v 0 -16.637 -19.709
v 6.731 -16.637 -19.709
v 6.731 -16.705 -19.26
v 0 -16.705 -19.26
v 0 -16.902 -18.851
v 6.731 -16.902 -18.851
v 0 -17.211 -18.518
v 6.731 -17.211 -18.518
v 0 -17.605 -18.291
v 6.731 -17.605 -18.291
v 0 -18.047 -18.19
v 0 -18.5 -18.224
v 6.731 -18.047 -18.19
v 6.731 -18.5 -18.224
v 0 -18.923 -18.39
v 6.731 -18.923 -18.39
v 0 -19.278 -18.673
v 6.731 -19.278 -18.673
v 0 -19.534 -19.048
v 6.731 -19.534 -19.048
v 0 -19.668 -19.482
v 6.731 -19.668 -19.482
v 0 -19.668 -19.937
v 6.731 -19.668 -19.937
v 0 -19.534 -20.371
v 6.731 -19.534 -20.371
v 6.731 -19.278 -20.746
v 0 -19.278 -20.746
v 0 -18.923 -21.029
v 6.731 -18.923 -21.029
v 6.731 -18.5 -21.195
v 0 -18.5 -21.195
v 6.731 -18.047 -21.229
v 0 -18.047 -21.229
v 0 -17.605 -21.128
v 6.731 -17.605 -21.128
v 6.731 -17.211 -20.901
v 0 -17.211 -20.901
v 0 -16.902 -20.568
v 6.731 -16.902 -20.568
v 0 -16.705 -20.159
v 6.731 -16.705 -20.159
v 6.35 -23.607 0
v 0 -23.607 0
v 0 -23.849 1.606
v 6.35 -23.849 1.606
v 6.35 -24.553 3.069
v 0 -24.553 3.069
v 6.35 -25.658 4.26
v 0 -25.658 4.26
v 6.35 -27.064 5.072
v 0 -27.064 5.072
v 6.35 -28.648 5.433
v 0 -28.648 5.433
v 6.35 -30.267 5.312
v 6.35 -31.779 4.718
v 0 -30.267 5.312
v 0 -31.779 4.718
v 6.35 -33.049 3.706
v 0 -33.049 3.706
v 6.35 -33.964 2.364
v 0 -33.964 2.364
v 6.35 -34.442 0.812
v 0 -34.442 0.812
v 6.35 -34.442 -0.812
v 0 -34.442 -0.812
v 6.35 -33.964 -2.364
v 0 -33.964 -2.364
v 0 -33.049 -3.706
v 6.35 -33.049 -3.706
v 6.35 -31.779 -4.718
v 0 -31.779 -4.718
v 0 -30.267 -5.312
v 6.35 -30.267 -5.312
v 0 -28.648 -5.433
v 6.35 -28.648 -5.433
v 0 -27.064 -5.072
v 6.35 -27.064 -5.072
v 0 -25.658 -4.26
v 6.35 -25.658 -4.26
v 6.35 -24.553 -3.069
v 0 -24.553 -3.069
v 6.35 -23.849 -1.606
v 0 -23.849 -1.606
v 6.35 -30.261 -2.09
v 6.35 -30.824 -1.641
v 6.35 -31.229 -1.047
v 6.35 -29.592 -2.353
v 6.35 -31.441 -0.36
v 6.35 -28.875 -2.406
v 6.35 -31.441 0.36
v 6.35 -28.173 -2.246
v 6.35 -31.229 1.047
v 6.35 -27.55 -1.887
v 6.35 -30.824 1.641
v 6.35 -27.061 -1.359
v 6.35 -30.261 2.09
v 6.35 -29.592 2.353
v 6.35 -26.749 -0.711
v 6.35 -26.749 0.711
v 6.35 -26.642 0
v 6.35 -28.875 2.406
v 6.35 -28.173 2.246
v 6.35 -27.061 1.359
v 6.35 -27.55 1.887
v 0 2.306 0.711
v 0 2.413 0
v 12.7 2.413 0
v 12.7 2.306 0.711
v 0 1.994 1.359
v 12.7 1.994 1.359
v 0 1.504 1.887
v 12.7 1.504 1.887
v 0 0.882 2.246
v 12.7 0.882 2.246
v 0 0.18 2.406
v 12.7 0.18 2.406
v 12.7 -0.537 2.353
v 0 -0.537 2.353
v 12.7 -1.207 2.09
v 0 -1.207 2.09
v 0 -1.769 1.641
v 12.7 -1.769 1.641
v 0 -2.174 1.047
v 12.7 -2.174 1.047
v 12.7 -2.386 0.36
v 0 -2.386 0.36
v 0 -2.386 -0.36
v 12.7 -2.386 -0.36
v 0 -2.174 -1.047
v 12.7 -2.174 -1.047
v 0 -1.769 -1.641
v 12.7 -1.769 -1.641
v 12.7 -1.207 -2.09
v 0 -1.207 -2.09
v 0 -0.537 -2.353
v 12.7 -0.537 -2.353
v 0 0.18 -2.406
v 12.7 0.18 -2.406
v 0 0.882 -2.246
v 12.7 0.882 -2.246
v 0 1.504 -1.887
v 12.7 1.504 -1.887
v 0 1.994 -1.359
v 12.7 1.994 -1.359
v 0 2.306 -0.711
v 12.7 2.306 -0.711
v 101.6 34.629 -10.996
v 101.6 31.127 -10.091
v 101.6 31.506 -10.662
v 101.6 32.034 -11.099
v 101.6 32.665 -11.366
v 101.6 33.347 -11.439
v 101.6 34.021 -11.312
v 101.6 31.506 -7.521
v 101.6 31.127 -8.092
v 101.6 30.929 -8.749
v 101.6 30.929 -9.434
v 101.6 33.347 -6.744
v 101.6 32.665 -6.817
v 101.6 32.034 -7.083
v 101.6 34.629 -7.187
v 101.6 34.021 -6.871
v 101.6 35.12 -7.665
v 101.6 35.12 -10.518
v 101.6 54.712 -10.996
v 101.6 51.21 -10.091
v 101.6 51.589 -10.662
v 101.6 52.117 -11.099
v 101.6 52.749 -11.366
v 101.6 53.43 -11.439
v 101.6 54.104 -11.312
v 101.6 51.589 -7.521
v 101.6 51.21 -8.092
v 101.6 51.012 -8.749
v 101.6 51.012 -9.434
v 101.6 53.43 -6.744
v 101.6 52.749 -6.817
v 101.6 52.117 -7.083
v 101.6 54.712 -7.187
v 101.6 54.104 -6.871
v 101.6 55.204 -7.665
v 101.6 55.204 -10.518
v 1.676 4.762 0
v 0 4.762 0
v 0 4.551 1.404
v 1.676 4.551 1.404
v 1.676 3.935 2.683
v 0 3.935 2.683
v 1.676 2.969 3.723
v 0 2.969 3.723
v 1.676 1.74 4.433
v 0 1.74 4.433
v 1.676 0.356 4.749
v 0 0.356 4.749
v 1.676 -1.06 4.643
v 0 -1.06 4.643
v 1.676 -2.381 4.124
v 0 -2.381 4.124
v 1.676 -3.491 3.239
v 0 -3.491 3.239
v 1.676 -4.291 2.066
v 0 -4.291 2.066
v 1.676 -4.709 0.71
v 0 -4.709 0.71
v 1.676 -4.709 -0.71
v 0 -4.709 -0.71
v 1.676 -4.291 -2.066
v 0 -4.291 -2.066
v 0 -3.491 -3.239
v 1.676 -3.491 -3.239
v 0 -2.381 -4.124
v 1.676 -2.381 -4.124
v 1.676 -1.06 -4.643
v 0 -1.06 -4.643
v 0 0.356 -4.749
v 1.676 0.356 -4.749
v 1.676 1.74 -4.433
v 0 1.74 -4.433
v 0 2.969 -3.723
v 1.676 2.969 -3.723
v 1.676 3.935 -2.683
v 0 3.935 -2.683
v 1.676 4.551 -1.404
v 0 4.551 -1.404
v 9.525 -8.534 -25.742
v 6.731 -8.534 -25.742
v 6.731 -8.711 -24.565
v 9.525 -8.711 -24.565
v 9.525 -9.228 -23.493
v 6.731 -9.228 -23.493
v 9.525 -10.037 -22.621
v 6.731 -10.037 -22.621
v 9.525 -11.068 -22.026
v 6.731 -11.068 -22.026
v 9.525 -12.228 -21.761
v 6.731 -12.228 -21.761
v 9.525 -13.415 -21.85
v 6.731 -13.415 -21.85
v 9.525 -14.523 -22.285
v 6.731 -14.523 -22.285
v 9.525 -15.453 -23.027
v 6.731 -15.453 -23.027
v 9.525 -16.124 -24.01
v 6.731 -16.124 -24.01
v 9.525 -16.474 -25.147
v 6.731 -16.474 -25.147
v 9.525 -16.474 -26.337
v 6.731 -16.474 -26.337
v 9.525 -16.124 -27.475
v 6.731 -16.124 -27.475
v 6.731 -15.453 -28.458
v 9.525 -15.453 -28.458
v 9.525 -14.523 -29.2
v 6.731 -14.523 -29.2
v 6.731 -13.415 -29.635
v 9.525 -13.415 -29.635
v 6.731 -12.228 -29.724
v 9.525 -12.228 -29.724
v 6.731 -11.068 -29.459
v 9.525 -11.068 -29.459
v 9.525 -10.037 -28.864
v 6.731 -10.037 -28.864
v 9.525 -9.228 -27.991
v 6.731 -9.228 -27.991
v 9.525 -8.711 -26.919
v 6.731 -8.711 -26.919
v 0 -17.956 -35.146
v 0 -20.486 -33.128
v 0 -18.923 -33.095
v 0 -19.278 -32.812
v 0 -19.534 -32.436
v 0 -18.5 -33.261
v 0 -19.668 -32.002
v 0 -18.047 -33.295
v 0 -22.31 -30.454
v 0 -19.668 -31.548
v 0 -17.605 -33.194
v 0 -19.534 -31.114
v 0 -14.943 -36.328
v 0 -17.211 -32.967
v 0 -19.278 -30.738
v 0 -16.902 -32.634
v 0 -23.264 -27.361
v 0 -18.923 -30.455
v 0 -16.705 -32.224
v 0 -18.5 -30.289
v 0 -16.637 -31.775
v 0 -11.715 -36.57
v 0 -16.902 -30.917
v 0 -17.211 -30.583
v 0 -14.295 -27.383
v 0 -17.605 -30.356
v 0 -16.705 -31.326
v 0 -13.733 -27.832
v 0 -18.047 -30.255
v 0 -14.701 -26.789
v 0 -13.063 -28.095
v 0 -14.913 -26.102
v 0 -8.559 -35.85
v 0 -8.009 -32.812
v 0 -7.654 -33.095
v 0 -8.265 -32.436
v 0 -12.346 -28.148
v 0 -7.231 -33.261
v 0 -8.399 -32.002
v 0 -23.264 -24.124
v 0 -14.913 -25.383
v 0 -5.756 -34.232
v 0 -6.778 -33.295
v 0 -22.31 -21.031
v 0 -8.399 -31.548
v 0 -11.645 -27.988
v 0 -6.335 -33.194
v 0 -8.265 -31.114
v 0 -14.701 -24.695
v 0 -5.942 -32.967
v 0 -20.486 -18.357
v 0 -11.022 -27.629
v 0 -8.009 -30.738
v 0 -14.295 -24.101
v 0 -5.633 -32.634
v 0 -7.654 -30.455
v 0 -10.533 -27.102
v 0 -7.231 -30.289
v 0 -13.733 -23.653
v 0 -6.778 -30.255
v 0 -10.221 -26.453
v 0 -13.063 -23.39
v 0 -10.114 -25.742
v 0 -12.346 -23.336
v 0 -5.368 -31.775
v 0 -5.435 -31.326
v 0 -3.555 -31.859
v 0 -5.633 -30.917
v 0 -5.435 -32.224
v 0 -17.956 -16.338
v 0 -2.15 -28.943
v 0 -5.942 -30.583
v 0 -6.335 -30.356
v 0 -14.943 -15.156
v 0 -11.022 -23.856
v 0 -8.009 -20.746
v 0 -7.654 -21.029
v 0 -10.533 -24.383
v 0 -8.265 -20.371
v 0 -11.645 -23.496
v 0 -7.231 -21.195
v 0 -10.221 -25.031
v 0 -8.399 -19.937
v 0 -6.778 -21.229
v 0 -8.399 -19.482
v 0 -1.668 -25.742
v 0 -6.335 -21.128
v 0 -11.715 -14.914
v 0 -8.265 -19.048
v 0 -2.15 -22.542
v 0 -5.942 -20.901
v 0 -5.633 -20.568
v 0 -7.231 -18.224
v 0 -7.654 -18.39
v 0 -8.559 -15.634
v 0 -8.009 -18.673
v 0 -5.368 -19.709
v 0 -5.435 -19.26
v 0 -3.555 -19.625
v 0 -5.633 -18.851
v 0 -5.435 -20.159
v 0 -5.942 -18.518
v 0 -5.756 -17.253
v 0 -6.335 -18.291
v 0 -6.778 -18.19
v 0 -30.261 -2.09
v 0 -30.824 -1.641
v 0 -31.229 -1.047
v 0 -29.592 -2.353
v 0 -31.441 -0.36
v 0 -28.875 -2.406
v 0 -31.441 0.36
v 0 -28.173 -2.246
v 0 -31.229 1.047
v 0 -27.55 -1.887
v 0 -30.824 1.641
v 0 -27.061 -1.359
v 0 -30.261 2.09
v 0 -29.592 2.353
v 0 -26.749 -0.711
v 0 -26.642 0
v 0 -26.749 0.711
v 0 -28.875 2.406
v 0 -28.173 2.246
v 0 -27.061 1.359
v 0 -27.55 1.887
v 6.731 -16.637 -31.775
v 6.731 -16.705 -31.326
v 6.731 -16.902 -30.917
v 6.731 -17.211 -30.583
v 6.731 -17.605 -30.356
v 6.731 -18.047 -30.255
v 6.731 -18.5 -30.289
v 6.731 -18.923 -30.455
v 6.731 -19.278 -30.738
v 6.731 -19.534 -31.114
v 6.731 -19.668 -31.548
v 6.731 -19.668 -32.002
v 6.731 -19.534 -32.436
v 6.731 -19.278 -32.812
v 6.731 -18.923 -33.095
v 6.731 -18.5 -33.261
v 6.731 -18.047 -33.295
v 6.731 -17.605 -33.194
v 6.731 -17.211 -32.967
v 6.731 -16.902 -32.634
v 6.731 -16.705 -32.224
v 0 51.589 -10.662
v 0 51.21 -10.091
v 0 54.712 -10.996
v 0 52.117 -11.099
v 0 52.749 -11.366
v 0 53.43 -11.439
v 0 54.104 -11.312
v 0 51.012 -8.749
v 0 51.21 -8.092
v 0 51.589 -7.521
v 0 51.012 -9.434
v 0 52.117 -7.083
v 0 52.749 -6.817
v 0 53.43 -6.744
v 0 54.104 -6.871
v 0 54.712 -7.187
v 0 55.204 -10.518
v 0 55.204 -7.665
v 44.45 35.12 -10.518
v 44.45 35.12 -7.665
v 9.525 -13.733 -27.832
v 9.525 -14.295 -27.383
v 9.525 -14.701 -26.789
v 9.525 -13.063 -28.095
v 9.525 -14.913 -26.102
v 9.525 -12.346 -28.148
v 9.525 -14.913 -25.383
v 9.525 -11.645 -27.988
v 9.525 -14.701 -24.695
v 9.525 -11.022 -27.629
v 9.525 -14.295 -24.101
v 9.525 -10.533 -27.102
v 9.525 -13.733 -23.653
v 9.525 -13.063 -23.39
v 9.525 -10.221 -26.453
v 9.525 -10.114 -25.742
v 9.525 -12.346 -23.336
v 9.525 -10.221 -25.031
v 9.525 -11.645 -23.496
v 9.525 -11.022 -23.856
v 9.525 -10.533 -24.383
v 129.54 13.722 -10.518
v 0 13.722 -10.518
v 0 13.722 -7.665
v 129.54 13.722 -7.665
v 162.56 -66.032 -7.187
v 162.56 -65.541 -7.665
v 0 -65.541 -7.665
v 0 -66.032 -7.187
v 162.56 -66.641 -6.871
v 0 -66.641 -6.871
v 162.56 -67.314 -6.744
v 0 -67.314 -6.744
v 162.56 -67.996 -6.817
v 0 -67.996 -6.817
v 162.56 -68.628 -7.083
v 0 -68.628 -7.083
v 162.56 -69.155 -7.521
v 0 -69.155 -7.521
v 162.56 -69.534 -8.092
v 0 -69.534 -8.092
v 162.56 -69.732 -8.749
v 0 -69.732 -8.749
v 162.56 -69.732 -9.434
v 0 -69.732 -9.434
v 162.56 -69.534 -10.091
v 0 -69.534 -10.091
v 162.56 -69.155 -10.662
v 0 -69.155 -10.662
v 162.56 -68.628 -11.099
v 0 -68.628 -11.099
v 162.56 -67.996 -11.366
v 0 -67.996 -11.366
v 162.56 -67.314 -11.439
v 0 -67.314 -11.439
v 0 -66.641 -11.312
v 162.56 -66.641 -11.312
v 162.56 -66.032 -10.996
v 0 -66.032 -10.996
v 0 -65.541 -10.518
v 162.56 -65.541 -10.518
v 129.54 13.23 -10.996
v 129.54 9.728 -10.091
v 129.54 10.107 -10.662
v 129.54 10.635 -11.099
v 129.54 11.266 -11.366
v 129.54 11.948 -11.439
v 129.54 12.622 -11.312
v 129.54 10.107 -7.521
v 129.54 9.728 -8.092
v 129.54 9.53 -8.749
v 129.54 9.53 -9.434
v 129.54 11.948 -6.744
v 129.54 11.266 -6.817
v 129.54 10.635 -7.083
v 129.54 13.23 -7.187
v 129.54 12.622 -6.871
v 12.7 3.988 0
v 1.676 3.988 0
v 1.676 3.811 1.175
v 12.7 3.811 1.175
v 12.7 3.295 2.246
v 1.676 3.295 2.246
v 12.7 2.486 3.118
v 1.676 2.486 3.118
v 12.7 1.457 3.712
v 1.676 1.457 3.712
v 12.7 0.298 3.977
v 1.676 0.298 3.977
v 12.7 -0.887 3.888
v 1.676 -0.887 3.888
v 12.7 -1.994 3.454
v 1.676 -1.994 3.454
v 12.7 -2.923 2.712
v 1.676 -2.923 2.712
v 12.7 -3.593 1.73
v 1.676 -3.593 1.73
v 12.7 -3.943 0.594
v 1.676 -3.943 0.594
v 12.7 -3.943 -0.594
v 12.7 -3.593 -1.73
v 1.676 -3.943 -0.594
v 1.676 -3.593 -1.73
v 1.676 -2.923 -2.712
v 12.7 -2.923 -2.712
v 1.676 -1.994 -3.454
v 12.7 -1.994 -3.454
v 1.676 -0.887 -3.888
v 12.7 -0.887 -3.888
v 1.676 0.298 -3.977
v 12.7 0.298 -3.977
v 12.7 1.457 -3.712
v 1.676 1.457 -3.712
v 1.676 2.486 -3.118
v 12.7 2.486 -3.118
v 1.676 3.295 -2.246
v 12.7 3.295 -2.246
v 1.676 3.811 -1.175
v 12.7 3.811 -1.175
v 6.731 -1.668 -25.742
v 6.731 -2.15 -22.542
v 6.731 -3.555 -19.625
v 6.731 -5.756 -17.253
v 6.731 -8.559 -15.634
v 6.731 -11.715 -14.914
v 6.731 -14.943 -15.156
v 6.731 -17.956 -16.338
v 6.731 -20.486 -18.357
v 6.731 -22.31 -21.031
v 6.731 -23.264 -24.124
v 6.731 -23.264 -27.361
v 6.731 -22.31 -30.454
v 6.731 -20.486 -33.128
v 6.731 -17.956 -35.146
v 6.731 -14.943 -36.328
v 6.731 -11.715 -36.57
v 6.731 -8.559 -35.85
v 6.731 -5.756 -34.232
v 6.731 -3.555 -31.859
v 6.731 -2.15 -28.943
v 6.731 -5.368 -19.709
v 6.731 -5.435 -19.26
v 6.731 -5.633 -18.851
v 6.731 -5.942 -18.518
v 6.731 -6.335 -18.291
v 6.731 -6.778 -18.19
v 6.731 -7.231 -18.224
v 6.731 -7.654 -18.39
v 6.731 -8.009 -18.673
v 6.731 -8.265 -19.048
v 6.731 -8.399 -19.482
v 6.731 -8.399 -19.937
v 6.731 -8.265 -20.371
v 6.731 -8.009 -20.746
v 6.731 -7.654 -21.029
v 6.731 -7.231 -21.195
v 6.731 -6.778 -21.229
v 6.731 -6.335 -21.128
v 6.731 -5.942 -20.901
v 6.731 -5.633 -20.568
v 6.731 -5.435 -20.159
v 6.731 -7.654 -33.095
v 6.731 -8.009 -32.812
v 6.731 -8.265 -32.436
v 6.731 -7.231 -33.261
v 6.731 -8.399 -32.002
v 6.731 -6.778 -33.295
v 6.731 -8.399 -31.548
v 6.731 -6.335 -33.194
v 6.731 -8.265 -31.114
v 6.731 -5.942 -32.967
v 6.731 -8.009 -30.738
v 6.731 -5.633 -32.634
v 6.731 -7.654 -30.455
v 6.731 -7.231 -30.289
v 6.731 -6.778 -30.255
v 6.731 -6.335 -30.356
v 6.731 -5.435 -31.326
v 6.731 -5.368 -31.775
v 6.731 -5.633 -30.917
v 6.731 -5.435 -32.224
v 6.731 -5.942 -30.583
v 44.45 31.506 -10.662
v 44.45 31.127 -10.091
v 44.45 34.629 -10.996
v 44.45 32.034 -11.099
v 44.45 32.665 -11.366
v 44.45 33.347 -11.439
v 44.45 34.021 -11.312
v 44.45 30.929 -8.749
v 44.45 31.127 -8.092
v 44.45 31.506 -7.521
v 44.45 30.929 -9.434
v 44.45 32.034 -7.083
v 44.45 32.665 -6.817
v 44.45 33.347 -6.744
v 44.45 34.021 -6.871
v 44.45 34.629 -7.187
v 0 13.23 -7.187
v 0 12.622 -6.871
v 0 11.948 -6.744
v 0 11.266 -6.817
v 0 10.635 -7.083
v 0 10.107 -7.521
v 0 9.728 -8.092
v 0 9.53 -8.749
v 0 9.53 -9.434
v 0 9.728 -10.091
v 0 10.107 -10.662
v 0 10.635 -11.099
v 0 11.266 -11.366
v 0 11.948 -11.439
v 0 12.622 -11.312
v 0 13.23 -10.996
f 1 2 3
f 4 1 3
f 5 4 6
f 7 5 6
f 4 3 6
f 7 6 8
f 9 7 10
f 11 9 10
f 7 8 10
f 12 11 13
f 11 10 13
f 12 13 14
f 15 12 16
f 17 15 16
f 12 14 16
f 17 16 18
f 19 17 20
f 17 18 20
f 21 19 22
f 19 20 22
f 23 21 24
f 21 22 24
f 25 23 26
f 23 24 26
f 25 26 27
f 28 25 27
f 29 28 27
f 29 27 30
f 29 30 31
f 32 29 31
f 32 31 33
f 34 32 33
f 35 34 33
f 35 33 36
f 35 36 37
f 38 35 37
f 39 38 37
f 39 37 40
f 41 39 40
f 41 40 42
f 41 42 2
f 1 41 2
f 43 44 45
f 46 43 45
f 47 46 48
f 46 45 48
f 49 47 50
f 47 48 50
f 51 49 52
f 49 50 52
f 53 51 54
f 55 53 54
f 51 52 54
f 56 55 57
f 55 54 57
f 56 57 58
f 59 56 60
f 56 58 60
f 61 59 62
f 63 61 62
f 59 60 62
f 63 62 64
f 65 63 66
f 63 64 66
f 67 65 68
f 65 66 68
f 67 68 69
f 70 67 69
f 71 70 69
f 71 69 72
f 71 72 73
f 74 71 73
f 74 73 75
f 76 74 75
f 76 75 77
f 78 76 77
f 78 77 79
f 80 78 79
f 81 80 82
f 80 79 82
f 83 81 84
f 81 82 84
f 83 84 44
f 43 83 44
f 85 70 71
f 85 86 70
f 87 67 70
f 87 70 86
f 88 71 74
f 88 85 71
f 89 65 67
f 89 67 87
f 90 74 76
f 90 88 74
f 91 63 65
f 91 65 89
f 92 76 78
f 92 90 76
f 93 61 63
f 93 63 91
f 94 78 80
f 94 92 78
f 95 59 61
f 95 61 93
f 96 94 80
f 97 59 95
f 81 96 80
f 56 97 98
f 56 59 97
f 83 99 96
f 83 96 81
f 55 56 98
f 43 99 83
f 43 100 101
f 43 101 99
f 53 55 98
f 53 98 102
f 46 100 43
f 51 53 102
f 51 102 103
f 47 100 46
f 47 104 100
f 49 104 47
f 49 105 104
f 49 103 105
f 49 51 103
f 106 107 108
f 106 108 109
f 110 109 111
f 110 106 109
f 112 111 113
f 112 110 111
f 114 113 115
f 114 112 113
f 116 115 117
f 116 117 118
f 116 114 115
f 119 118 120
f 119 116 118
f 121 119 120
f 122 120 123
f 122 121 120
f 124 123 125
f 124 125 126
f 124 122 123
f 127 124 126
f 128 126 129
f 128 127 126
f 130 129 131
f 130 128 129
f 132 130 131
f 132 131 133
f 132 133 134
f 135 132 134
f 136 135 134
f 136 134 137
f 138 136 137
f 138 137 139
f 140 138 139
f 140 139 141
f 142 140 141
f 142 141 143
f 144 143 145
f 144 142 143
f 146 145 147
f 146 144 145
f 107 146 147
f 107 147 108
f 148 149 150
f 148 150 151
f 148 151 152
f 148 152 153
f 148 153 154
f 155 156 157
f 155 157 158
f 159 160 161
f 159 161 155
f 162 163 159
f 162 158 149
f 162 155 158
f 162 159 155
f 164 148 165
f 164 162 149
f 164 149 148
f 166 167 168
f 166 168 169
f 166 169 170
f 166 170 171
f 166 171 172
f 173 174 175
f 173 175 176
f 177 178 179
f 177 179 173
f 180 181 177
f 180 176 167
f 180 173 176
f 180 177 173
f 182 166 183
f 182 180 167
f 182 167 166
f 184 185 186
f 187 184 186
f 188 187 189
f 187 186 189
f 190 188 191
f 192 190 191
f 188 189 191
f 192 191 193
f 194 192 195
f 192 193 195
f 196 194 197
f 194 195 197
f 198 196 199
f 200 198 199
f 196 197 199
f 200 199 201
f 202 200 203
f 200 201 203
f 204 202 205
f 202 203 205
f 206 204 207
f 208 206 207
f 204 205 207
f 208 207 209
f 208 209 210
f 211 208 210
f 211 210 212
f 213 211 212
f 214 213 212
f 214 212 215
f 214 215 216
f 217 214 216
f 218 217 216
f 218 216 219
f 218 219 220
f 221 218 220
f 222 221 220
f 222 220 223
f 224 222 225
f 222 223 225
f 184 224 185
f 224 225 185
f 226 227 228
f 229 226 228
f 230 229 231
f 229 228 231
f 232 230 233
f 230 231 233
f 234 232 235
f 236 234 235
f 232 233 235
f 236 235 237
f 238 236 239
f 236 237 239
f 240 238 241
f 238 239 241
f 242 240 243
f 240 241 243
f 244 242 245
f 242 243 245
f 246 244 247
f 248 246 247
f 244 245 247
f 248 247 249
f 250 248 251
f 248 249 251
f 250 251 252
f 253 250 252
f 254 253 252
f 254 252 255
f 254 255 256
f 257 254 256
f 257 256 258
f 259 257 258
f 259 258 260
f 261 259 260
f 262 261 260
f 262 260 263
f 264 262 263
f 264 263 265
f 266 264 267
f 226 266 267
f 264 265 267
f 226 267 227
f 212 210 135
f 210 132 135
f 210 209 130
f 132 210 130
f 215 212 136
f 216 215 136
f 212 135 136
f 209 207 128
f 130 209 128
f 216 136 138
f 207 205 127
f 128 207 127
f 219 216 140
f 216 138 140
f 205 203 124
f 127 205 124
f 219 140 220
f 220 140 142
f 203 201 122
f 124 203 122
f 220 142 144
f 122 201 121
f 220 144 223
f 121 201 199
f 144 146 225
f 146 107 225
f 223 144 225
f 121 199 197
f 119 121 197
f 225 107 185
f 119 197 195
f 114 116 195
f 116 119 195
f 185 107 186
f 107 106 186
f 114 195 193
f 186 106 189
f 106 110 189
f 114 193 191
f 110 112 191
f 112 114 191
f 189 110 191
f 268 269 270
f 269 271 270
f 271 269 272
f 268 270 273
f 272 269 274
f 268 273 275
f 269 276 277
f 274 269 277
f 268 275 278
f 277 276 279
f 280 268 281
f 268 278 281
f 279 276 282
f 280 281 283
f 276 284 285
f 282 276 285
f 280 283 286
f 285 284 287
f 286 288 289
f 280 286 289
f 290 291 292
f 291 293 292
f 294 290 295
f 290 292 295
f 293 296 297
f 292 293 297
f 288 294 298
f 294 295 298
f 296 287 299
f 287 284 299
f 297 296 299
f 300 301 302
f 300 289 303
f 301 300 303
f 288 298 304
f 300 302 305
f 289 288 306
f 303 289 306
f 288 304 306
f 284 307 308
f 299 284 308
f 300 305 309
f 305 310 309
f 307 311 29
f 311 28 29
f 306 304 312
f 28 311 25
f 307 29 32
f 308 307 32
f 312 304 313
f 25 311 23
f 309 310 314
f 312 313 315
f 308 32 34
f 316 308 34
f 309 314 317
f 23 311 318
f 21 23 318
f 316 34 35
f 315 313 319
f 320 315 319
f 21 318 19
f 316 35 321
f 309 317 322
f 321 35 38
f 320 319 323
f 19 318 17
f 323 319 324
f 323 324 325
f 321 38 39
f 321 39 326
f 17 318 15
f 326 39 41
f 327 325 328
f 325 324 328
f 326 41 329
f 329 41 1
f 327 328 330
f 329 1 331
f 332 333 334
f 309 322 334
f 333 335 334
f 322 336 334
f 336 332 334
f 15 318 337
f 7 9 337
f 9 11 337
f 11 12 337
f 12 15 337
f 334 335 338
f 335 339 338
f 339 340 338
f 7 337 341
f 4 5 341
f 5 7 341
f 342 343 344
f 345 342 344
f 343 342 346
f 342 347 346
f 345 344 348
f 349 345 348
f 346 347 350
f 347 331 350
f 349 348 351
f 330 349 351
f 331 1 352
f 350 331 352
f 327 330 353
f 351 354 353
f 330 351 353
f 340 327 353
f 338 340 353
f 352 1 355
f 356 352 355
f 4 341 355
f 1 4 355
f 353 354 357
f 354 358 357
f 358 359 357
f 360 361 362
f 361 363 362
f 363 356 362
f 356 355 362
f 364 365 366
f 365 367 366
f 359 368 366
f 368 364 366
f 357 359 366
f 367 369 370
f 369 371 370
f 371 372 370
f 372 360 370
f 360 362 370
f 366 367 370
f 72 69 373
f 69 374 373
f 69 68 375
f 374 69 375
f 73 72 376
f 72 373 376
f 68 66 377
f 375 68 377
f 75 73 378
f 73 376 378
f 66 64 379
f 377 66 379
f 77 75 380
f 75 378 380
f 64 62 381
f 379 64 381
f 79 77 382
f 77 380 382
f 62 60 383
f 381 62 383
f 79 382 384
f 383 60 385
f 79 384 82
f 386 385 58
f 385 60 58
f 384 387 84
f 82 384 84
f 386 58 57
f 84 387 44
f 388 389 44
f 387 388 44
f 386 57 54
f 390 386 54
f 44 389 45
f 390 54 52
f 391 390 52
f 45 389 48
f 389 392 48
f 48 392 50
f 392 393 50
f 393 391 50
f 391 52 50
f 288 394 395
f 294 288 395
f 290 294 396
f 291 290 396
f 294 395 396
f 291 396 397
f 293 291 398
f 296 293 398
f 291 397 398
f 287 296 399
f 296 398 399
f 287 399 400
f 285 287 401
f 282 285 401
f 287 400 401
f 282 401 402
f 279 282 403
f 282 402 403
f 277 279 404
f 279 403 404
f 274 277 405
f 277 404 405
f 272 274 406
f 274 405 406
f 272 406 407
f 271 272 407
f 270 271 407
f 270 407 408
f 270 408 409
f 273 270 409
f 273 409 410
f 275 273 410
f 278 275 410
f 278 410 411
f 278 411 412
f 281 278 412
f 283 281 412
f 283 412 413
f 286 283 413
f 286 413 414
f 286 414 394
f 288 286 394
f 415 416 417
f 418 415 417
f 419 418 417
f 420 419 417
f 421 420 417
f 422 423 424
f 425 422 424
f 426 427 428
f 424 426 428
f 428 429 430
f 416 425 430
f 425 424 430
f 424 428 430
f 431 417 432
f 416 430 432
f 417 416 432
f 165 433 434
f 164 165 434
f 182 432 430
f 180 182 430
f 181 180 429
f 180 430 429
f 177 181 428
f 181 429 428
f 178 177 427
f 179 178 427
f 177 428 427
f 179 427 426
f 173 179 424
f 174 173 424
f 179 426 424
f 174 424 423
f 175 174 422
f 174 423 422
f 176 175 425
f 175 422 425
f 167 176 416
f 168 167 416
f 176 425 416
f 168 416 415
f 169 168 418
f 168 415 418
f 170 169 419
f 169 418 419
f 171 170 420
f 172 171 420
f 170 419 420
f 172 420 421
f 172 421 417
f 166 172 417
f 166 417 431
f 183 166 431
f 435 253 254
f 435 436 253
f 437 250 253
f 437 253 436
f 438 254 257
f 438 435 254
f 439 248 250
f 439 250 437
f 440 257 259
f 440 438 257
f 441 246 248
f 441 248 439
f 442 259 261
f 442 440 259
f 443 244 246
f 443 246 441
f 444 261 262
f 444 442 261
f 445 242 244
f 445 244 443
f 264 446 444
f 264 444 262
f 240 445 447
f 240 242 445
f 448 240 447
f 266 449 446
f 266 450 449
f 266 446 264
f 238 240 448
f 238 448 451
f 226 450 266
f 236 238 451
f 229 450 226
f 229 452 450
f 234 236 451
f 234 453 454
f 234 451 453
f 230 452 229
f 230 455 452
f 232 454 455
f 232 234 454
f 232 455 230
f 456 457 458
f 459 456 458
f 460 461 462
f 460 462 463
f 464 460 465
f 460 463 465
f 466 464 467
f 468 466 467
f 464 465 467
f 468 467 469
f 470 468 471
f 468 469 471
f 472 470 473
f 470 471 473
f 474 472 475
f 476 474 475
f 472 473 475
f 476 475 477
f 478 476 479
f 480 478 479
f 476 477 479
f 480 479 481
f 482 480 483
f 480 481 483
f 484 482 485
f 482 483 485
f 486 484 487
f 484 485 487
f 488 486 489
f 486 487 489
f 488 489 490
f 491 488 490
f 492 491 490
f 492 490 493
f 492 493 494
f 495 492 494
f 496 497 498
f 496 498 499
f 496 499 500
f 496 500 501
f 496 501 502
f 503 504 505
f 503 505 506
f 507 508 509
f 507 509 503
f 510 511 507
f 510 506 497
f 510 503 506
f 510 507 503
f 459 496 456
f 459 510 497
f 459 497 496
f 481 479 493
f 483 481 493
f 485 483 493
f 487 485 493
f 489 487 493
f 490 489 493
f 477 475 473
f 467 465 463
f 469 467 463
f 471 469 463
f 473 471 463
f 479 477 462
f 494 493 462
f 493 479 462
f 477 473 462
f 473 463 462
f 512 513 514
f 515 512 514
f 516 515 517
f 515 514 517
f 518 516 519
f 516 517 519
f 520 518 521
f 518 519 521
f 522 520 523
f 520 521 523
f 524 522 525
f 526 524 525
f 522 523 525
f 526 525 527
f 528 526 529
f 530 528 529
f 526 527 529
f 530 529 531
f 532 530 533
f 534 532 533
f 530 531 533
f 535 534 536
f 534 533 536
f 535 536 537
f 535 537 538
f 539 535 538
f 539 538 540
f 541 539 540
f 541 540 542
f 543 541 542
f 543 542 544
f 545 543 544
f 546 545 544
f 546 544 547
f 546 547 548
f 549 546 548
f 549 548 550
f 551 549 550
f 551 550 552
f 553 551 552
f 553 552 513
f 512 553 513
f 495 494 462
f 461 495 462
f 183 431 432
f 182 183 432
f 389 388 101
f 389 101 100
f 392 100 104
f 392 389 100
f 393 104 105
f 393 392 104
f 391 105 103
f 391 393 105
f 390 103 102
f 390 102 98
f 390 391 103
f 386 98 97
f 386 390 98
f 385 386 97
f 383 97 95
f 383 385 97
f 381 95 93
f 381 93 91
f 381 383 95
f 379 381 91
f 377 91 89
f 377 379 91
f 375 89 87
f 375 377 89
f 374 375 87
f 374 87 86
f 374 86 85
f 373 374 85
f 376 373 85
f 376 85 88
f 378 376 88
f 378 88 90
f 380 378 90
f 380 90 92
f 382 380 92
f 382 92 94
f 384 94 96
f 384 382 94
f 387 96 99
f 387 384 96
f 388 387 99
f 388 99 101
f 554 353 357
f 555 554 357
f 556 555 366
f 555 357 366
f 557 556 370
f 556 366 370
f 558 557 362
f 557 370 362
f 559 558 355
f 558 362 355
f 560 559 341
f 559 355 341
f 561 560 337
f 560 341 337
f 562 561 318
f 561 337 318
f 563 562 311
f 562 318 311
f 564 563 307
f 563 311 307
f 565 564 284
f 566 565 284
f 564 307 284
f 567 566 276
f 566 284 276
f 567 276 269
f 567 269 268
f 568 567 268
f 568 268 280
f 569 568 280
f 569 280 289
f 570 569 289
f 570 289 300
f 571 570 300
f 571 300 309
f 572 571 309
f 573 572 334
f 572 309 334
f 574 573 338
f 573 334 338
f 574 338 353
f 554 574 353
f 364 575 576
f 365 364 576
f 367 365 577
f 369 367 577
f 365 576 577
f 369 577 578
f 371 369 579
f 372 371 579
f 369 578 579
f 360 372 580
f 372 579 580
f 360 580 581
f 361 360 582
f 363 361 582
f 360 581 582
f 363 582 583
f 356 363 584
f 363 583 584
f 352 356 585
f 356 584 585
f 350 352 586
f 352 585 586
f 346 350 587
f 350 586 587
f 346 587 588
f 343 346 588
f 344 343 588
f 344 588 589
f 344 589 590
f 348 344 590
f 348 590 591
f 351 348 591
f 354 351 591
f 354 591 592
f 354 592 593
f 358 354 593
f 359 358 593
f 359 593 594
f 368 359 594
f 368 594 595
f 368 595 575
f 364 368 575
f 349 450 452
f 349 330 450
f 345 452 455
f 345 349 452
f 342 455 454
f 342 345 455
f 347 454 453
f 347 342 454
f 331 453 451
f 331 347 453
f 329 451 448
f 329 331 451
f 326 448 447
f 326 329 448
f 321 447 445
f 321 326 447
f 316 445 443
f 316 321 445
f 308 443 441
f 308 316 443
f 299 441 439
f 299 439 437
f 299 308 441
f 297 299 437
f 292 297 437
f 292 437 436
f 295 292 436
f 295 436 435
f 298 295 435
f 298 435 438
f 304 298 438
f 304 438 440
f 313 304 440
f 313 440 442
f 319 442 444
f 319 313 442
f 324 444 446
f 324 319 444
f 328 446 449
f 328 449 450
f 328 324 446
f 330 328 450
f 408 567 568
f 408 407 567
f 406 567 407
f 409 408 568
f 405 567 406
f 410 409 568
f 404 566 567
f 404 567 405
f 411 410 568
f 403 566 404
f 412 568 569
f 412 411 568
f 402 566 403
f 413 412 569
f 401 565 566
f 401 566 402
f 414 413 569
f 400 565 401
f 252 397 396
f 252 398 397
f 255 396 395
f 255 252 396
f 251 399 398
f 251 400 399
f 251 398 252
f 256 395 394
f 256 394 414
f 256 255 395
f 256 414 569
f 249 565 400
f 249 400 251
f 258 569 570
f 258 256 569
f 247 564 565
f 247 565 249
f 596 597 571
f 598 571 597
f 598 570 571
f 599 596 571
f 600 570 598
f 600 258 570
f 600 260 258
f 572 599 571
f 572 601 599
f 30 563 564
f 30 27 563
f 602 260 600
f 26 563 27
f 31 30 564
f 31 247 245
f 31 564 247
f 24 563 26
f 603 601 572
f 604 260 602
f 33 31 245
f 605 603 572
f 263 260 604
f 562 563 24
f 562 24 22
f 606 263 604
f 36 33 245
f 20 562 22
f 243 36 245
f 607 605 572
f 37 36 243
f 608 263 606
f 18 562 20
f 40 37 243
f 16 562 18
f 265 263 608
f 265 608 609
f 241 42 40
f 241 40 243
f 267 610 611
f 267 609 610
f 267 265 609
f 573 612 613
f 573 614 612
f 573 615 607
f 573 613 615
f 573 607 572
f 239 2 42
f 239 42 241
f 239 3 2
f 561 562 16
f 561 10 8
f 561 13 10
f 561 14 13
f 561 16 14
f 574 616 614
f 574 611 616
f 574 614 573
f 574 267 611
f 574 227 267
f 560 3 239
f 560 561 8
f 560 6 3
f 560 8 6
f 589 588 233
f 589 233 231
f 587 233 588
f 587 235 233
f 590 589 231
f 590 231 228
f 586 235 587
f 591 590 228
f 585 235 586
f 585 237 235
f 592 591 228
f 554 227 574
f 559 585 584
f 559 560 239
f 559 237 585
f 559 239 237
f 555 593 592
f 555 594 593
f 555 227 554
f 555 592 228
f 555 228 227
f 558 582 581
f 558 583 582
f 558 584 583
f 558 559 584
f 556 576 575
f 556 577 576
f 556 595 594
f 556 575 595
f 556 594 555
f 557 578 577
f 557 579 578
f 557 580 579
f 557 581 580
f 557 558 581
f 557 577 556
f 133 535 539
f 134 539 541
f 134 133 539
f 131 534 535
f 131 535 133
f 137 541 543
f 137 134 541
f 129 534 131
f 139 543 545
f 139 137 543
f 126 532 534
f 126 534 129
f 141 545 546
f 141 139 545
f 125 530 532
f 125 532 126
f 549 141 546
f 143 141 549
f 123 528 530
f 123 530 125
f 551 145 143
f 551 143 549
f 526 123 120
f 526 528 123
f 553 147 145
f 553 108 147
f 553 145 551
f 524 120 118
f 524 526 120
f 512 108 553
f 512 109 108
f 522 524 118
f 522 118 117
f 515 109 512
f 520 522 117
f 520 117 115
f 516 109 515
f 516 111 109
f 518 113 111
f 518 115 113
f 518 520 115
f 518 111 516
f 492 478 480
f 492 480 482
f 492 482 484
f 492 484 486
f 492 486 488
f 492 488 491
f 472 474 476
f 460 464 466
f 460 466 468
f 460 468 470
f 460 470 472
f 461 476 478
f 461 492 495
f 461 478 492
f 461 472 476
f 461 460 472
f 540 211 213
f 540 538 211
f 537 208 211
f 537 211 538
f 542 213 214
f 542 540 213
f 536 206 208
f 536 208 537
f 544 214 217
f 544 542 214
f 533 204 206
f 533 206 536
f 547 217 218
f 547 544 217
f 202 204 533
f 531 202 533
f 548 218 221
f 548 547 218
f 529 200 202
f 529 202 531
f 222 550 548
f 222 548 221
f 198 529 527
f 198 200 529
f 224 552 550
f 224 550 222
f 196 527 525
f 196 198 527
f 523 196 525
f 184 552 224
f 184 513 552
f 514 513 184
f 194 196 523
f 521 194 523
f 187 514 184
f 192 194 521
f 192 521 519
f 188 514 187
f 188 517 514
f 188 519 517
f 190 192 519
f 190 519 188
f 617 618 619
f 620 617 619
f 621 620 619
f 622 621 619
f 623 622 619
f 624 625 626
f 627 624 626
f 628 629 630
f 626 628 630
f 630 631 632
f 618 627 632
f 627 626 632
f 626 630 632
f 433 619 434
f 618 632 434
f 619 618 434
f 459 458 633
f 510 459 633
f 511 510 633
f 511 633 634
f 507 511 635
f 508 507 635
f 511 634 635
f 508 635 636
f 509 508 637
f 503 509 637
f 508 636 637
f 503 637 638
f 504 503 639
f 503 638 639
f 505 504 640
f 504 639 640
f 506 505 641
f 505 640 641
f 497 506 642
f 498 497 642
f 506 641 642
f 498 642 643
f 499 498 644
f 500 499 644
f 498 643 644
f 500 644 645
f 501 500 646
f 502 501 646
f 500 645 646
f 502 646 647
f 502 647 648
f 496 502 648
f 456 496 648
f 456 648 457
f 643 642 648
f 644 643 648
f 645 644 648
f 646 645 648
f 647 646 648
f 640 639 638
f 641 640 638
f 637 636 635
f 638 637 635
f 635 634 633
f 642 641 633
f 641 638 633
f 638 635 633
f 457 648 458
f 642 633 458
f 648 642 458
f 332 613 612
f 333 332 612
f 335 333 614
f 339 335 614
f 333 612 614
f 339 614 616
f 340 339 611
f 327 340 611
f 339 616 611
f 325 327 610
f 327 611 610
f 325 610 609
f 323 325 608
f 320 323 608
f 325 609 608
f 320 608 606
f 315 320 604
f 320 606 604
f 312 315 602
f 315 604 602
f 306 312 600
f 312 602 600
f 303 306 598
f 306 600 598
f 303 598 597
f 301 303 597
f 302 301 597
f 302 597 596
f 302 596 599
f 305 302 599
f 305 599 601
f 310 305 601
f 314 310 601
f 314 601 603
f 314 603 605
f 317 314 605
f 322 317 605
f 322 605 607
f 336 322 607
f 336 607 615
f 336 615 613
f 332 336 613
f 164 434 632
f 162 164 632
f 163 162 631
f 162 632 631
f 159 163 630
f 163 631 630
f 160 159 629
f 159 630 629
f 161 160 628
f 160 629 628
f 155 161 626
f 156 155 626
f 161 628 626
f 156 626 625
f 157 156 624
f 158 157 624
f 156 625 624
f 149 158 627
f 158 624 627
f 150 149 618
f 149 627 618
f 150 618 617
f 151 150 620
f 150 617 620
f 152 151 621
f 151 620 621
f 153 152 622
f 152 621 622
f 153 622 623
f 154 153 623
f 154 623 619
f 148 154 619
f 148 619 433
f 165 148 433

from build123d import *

# Parameters (mm, degrees)
F0_R      = 4.7625
F0_R_2    = 3.9878
F1_DEPTH  = 1.6764
F0_R_3    = 2.413
F2_DEPTH  = 12.7
F3_R      = 5.4483
F3_R_2    = 2.413
F4_DEPTH  = 6.35
F5_R      = 10.8585
F5_R_2    = 2.413
F6_DEPTH  = 6.731
F7_R      = 3.9925331181
F7_R_2    = 2.413
F8_DEPTH  = 2.794
F10_D     = 3.048
F12_DEPTH = 129.54
F14_DEPTH = 27.94
F16_DEPTH = 33.02
F18_DEPTH = 44.45


with BuildPart() as f1:
    # F0 (on Right) → F1 (new body)
    with BuildSketch(Plane.YZ):
        Circle(F0_R)
        Circle(F0_R_2, mode=Mode.SUBTRACT)
    extrude(amount=F1_DEPTH)

    # F0 (on Right) → F2 (join)
    with BuildSketch(Plane.YZ):
        Circle(F0_R_2)
        Circle(F0_R_3, mode=Mode.SUBTRACT)
    extrude(amount=F2_DEPTH)


with BuildPart() as f4:
    # F3 (on Right) → F4 (new body)
    with BuildSketch(Plane.YZ):
        with Locations((-29.054964603, 0)):
            Circle(F3_R)
        with Locations((-29.054964603, 0)):
            Circle(F3_R_2, mode=Mode.SUBTRACT)
    extrude(amount=F4_DEPTH)


with BuildPart() as f6:
    # F5 (on Right) → F6 (new body)
    with BuildSketch(Plane.YZ):
        with Locations((-12.5265177339, -25.7422216237)):
            Circle(F5_R)
        with Locations((-12.5265177339, -25.7422216237)):
            Circle(F5_R_2, mode=Mode.SUBTRACT)
    extrude(amount=F6_DEPTH)

    # F7 (on face) → F8 (join)
    with BuildSketch(Plane.YZ.offset(6.731)):
        with Locations((-12.5265177339, -25.7422216237)):
            Circle(F7_R)
        with Locations((-12.5265177339, -25.7422216237)):
            Circle(F7_R_2, mode=Mode.SUBTRACT)
    extrude(amount=F8_DEPTH)

    # F10 (through all)
    with Locations(Plane(origin=(0, 0, 0), x_dir=(0, -1, 0), z_dir=(-1, 0, 0))):
        with Locations((6.8917556933, -19.7094377103), (18.1612797746, -19.7094377103), (18.1612797746, -31.775005537), (6.8917556933, -31.775005537)):
            Hole(F10_D / 2)


with BuildPart() as f12:
    # F11 (on Right) → F12 (new body)
    with BuildSketch(Plane.YZ):
        with BuildLine():
            Line((13.721502339, -10.5178534441), (13.721502339, -7.6649008402))
            ThreePointArc((13.721502339, -7.6649008402), (9.505102339, -9.0913771421), (13.721502339, -10.5178534441))
        make_face()
    extrude(amount=F12_DEPTH)


with BuildPart() as f13_1:
    # F13: copy of F12
    add(f12.part.moved(Location((0, 41.48225, 0))))

    # F14 (cut): a face of the model
    f14_faces = [f13_1.faces().sort_by_distance(p)[0] for p in [
        (129.54, 53.2188838288, -9.0913771421),
    ]]
    extrude(f14_faces, amount=-F14_DEPTH, mode=Mode.SUBTRACT)


with BuildPart() as f15_1:
    # F15: copy of F12
    add(f12.part.moved(Location((0, -79.26249, 0))))

    # F16 (add): a face of the model
    f16_faces = [f15_1.faces().sort_by_distance(p)[0] for p in [
        (129.54, -67.5258561712, -9.0913771421),
    ]]
    extrude(f16_faces, amount=F16_DEPTH)


with BuildPart() as f17_1:
    # F17: copy of F13_1
    add(f13_1.part.moved(Location((0, -20.08332, 0))))

    # F18 (cut): a face of the model
    f18_faces = [f17_1.faces().sort_by_distance(p)[0] for p in [
        (0, 33.1355638288, -9.0913771421),
    ]]
    extrude(f18_faces, amount=-F18_DEPTH, mode=Mode.SUBTRACT)


solid = Compound([f1.part, f4.part, f6.part, f12.part, f13_1.part, f15_1.part, f17_1.part])
